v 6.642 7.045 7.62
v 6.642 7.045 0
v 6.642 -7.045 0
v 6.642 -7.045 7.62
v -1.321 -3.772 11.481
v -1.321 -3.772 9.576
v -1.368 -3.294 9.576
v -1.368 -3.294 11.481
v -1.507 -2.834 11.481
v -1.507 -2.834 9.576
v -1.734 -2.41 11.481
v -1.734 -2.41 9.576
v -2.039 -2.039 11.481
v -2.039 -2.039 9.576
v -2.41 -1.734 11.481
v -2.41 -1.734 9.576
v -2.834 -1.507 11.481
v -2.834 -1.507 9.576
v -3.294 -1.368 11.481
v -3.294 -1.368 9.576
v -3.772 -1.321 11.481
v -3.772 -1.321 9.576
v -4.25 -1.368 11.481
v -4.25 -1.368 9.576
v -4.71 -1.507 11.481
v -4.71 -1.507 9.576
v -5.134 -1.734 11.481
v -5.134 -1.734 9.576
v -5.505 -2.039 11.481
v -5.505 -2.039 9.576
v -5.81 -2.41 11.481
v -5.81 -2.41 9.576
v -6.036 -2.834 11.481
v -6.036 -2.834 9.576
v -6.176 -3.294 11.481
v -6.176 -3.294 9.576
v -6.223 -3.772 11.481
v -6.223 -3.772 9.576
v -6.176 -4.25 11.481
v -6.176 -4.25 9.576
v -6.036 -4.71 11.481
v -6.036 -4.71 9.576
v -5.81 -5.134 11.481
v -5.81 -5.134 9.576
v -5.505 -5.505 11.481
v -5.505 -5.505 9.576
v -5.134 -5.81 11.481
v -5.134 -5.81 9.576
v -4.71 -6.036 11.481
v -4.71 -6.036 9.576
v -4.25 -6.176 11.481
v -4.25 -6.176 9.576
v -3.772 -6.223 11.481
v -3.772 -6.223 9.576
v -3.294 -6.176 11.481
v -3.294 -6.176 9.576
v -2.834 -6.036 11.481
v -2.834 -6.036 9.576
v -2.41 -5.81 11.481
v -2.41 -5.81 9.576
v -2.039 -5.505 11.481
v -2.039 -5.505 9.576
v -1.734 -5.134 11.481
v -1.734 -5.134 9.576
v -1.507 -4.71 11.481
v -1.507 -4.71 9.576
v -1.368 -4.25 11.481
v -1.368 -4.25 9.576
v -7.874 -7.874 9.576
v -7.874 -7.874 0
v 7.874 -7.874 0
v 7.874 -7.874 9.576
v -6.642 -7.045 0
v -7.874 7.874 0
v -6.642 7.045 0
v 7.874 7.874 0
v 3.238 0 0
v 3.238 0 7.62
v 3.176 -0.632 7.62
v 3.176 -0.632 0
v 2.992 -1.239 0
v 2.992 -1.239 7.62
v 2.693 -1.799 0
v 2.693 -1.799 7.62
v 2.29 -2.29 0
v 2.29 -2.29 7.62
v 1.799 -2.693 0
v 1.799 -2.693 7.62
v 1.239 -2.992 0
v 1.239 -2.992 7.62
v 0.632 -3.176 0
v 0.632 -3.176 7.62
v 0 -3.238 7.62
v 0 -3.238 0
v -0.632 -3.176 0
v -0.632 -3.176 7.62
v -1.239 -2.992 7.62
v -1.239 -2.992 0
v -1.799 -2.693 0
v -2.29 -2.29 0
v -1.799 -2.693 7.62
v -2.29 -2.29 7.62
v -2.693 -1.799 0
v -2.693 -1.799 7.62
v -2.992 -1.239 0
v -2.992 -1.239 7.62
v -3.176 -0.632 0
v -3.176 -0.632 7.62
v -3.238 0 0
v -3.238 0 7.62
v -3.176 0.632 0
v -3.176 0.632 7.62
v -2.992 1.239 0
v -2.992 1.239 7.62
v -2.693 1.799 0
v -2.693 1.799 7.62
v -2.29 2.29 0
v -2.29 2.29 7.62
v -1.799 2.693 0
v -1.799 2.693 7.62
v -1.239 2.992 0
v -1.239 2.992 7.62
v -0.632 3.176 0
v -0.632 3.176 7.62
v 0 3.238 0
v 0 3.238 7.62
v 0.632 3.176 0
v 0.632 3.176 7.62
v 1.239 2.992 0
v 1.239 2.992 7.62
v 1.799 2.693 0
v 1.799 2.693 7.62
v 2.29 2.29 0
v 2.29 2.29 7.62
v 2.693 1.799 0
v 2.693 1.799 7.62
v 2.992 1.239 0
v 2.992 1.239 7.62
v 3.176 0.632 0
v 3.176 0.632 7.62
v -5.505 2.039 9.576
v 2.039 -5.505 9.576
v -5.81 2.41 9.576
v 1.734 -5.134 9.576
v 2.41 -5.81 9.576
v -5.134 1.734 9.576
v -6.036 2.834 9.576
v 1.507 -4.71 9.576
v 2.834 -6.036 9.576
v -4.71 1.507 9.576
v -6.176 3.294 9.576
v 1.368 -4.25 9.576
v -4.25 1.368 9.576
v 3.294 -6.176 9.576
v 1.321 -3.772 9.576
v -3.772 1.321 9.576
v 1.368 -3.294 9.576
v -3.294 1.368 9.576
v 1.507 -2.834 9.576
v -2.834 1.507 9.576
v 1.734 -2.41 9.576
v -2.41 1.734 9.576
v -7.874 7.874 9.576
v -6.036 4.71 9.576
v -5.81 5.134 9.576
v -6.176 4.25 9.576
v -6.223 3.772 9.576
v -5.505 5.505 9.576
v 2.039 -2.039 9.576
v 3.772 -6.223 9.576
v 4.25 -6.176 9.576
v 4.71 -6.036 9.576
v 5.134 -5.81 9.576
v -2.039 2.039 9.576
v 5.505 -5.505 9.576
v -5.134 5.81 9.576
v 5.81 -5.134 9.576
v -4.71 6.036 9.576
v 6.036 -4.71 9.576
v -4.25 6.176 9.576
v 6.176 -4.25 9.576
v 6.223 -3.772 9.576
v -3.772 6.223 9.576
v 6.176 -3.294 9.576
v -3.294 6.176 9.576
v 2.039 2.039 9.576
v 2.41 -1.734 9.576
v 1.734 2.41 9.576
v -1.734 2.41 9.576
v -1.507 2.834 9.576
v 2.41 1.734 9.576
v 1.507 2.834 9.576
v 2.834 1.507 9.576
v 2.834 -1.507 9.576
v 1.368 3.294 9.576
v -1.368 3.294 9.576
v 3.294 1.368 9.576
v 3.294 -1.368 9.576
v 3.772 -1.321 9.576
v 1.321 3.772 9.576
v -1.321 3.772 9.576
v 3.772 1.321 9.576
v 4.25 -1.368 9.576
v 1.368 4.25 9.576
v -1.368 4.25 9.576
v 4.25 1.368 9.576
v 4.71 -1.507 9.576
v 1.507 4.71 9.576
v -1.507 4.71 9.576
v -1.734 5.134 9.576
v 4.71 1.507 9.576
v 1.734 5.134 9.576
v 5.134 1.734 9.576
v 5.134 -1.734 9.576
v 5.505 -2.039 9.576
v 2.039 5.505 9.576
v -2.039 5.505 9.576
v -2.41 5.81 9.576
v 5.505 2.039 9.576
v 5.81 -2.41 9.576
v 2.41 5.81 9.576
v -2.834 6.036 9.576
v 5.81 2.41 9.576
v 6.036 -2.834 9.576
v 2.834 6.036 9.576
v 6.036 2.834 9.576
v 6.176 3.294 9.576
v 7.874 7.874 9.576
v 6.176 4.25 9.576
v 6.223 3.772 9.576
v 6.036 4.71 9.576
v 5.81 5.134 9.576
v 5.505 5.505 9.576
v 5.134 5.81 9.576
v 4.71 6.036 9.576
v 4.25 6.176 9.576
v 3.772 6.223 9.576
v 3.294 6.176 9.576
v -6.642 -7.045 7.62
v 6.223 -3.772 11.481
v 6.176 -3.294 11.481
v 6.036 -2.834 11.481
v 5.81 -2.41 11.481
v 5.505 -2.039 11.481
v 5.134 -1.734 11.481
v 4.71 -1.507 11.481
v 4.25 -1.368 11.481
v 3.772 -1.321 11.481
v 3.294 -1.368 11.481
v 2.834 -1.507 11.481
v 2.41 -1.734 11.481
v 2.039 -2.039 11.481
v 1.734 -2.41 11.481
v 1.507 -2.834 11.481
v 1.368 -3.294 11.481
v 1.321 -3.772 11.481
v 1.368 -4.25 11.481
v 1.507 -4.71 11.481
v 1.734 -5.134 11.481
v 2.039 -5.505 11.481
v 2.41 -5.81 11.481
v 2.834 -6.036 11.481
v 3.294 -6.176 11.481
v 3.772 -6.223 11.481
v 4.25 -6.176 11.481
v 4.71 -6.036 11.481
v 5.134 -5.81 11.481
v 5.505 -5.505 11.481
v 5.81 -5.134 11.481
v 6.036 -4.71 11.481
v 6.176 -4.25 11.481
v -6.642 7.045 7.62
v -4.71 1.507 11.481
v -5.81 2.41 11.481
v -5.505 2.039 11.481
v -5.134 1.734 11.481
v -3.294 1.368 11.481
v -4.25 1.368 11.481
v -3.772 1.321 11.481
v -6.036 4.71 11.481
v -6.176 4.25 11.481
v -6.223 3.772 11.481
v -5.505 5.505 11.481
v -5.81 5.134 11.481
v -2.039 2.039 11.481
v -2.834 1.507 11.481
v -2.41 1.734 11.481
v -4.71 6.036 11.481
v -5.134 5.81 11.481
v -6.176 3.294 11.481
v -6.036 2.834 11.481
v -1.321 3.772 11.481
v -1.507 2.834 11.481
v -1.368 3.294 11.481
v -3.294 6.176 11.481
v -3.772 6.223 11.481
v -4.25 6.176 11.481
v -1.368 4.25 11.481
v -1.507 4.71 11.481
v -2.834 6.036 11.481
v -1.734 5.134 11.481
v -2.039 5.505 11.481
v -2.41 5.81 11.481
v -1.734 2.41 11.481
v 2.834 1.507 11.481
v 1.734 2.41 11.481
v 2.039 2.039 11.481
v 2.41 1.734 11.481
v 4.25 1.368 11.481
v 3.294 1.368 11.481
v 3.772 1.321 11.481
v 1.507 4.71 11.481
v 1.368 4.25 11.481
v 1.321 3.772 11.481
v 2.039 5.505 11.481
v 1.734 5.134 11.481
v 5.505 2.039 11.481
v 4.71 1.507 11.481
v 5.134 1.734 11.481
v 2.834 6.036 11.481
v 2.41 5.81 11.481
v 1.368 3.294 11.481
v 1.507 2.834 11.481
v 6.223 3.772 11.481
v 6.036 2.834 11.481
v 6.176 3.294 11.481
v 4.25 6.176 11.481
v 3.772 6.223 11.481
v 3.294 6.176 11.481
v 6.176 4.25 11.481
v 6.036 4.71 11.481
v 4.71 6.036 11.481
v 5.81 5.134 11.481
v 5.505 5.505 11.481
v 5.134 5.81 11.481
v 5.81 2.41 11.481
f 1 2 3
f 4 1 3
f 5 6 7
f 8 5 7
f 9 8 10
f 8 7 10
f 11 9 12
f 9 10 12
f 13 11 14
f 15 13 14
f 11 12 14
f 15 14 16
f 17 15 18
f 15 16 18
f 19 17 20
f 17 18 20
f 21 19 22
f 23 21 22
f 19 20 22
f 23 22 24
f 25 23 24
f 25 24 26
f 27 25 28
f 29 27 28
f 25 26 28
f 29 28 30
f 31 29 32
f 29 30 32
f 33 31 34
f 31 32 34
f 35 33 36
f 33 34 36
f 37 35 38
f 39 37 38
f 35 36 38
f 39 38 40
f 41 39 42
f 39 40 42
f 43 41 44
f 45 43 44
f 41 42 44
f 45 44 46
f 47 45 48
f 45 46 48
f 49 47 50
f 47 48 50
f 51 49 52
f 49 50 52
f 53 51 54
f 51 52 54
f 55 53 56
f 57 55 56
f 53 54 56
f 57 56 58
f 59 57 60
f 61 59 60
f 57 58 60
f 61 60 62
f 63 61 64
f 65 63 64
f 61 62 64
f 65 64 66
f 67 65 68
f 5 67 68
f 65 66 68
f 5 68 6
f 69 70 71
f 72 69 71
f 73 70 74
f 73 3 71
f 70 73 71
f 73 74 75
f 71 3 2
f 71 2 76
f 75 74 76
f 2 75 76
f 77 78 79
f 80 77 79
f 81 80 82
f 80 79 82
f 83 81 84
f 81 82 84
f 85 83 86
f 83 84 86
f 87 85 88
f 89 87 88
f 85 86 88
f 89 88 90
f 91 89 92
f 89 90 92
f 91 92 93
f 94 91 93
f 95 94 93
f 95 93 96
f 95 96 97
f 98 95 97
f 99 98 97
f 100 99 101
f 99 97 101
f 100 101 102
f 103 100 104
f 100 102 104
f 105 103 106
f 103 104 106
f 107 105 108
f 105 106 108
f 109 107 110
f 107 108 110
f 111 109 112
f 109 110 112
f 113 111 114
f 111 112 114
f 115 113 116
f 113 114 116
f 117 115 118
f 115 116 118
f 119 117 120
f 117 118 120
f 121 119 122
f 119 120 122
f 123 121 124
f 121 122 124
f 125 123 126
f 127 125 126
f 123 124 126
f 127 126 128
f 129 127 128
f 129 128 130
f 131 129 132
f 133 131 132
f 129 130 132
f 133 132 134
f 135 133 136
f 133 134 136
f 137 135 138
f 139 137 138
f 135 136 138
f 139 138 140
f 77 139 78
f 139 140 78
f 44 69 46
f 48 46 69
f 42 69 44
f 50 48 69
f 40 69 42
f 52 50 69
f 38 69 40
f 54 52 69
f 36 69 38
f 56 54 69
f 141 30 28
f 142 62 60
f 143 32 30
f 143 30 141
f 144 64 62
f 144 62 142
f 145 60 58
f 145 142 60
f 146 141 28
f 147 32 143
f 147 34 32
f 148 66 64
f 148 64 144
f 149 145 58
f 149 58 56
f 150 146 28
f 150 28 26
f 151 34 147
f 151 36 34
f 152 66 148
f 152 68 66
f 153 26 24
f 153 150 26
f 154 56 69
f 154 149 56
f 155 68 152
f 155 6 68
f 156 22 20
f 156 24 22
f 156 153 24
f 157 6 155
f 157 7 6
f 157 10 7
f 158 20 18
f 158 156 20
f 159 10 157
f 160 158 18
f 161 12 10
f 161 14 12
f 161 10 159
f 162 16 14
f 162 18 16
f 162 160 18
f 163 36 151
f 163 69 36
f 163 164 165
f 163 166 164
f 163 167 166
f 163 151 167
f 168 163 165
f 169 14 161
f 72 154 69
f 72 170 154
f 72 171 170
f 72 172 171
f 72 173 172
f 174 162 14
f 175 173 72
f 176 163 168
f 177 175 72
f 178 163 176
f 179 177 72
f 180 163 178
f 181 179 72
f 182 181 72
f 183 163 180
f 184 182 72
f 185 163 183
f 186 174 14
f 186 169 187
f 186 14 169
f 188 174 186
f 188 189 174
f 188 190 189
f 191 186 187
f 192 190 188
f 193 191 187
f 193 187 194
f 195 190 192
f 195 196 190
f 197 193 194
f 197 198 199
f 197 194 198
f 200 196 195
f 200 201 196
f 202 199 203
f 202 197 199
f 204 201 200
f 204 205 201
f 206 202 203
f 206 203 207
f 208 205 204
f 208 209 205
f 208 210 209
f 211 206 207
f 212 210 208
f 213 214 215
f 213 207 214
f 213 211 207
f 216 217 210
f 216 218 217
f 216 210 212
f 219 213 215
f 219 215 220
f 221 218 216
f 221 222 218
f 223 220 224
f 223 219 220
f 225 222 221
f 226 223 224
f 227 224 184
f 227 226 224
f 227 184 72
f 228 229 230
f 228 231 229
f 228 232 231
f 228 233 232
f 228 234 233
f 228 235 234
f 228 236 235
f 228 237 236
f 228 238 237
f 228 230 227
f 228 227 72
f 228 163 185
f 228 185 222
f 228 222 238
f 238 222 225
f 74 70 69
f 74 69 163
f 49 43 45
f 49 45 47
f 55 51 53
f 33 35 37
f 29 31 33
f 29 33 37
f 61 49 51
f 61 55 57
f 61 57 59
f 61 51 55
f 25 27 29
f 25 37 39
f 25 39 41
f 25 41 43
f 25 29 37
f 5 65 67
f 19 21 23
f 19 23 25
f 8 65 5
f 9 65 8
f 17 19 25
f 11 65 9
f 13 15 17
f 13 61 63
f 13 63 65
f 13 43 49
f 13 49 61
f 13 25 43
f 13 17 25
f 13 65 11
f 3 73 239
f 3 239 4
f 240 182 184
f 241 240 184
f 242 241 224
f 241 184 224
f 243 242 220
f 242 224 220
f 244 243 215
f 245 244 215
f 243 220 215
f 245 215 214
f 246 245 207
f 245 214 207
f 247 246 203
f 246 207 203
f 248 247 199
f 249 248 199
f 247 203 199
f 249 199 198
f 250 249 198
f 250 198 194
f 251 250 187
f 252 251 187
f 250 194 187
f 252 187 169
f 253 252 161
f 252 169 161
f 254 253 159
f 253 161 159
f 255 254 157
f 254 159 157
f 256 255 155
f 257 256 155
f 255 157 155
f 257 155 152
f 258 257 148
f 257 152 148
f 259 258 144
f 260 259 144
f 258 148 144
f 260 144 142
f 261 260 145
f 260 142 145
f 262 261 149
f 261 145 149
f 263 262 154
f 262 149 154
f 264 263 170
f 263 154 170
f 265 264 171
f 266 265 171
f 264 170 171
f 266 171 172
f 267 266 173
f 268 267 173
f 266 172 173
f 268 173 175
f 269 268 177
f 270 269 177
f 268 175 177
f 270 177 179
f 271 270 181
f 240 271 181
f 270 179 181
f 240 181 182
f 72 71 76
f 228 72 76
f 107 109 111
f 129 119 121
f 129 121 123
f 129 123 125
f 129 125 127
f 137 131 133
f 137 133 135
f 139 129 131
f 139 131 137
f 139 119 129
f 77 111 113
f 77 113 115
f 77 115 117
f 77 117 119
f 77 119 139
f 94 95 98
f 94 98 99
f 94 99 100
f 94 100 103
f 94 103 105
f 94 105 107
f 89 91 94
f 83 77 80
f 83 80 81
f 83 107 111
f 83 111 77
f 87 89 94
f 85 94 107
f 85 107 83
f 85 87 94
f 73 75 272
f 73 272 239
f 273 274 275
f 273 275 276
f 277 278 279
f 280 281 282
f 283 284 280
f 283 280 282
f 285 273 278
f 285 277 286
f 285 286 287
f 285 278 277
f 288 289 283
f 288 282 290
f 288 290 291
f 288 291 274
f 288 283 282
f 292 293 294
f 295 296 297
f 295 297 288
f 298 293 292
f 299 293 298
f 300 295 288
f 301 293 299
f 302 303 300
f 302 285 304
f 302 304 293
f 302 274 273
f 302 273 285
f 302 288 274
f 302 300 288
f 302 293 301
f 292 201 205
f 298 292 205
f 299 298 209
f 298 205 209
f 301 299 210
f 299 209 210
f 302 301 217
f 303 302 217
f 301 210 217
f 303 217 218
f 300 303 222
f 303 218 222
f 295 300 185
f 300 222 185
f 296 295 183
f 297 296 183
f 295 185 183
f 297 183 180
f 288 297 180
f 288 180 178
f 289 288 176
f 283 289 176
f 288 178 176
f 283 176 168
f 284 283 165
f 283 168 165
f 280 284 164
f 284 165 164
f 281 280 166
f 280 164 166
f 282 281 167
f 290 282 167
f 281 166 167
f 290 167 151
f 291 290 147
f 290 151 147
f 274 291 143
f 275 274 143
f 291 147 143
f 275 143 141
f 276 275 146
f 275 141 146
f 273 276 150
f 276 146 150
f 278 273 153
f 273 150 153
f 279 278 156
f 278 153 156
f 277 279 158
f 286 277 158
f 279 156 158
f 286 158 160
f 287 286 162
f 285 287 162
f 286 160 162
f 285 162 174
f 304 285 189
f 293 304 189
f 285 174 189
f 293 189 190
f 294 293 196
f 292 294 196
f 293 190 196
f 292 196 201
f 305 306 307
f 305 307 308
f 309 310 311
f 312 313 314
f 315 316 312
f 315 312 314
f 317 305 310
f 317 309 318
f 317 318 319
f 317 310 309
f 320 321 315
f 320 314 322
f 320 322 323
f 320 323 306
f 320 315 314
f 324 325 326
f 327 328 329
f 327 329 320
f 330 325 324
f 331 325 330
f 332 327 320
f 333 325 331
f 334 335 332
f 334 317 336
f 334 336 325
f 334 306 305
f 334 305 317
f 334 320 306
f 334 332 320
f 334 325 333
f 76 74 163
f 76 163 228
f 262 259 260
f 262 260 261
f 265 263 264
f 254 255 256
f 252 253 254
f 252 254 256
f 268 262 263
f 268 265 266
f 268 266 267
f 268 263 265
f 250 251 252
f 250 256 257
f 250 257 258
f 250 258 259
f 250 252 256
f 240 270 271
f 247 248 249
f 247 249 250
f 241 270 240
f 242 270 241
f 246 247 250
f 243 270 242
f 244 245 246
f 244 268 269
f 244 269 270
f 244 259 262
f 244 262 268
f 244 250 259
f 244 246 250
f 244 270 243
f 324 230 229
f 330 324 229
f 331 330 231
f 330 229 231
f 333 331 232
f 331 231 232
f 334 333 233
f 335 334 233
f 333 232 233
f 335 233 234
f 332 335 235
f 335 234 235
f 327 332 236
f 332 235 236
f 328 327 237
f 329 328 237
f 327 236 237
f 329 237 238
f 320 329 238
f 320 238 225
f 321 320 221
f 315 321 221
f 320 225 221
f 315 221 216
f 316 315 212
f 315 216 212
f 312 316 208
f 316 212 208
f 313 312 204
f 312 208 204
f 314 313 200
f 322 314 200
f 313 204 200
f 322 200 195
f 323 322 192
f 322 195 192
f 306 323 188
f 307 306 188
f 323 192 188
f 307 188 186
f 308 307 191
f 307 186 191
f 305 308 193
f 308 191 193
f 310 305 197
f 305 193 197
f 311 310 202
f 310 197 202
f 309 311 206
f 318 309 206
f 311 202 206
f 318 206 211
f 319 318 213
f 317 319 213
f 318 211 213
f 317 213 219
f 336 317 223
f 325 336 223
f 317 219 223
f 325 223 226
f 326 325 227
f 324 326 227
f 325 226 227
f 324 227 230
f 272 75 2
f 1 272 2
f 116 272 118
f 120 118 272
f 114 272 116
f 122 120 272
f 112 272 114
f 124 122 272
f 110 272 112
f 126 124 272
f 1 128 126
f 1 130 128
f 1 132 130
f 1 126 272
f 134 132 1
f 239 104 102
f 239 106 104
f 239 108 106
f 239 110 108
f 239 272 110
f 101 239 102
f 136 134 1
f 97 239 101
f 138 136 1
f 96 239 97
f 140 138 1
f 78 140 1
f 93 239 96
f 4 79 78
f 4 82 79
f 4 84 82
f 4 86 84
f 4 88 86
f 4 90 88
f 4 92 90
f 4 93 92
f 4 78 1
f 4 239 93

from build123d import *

# Parameters (mm, degrees)
F0_W      = 15.748
F0_H      = 15.748
F1_DEPTH  = 9.5758
F2_R      = 2.4511
F4_DEPTH  = 1.905
F3_R      = 2.4511
F5_DEPTH  = 1.905
F6_R      = 2.4511
F7_DEPTH  = 1.905
F8_W      = 13.2842
F8_H      = 14.089584
F9_DEPTH  = 7.62
F10_R     = 3.2385
F11_DEPTH = 7.62


with BuildPart() as f1:
    # F0 (on Top) → F1 (new body)
    with BuildSketch(Plane.XY):
        Rectangle(F0_W, F0_H)
    extrude(amount=F1_DEPTH)

    # F2 (on face) → F4 (join)
    with BuildSketch(Plane.XY.offset(9.5758)):
        with Locations((-3.7719, 3.7719)):
            Circle(F2_R)
    extrude(amount=F4_DEPTH)

    # F3 (on face) → F5 (join)
    with BuildSketch(Plane.XY.offset(9.5758)):
        with Locations((-3.7719, -3.7719)):
            Circle(F3_R)
    extrude(amount=F5_DEPTH)

    # F6 (on face) → F7 (join)
    with BuildSketch(Plane.XY.offset(9.5758)):
        with Locations((3.7719, 3.7719)):
            Circle(F6_R)
        with Locations((3.7719, -3.7719)):
            Circle(F6_R)
    extrude(amount=F7_DEPTH)

    # F8 (on face) → F9 (cut)
    with BuildSketch(Plane(origin=(0, 0, 0), x_dir=(1, 0, 0), z_dir=(0, 0, -1))):
        Rectangle(F8_W, F8_H)
    extrude(amount=-F9_DEPTH, mode=Mode.SUBTRACT)

    # F10 (on face) → F11 (join)
    with BuildSketch(Plane(origin=(0, 0, 7.62), x_dir=(1, 0, 0), z_dir=(0, 0, -1))):
        Circle(F10_R)
    extrude(amount=F11_DEPTH)


solid = f1.part
